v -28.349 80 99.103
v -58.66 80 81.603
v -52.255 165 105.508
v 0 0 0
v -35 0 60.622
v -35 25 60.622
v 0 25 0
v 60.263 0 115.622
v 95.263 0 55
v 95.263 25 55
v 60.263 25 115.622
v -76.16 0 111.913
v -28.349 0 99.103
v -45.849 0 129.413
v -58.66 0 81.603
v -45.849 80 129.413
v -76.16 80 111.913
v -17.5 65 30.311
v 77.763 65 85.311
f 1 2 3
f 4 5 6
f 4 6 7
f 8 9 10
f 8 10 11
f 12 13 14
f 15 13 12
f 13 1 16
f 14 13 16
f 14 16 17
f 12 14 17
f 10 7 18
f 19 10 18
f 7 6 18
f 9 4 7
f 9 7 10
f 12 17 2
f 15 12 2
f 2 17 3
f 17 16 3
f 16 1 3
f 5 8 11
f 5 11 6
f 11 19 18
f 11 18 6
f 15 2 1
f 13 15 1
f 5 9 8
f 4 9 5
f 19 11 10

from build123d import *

# Parameters (mm, degrees)
EXTRUDE1_DEPTH = 25
EXTRUDE2_DEPTH = 110
EXTRUDE3_DEPTH = 80


with BuildPart() as part:
    # Sketch1 → Extrude1 (new body)
    with BuildSketch(Plane(origin=(0, 0, 0), x_dir=(1, 0, 0), z_dir=(0, 1, 0))):
        Polygon((0, 0), (95.262794416, -55), (60.262794416, -115.621778265), (-35, -60.621778265), align=None)
    extrude(amount=EXTRUDE1_DEPTH)

    # Sketch2 → Extrude2 (add)
    with BuildSketch(Plane(origin=(95.262794416, 0, 55), x_dir=(0.5, 0, -0.866025404), z_dir=(0.866025404, 0, 0.5))):
        Polygon((-70, 25), (0, 25), (-35, 65), align=None)
    extrude(amount=-EXTRUDE2_DEPTH)


with BuildPart() as body_2:
    # Sketch3 → Extrude3 (new body)
    with BuildSketch(Plane(origin=(0, 0, 0), x_dir=(1, 0, 0), z_dir=(0, 1, 0))):
        Polygon((-58.660254038, -81.602540378), (-28.349364905, -99.102540378), (-45.849364905, -129.413429511), (-76.160254038, -111.913429511), align=None)
    extrude(amount=EXTRUDE3_DEPTH)

    # Sketch4 → Loft1 section 0
    with BuildSketch(Plane(origin=(0, 80, 0), x_dir=(-1, 0, 0), z_dir=(0, 1, 0)), mode=Mode.PRIVATE) as loft1_s0:
        Polygon((58.660254038, 81.602540378), (28.349364905, 99.102540378), (45.849364905, 129.413429511), (76.160254038, 111.913429511), align=None)
    loft([Vertex(-52.254809472, 165, 105.507984945), loft1_s0.sketch])


solid = Compound([part.part, body_2.part])
